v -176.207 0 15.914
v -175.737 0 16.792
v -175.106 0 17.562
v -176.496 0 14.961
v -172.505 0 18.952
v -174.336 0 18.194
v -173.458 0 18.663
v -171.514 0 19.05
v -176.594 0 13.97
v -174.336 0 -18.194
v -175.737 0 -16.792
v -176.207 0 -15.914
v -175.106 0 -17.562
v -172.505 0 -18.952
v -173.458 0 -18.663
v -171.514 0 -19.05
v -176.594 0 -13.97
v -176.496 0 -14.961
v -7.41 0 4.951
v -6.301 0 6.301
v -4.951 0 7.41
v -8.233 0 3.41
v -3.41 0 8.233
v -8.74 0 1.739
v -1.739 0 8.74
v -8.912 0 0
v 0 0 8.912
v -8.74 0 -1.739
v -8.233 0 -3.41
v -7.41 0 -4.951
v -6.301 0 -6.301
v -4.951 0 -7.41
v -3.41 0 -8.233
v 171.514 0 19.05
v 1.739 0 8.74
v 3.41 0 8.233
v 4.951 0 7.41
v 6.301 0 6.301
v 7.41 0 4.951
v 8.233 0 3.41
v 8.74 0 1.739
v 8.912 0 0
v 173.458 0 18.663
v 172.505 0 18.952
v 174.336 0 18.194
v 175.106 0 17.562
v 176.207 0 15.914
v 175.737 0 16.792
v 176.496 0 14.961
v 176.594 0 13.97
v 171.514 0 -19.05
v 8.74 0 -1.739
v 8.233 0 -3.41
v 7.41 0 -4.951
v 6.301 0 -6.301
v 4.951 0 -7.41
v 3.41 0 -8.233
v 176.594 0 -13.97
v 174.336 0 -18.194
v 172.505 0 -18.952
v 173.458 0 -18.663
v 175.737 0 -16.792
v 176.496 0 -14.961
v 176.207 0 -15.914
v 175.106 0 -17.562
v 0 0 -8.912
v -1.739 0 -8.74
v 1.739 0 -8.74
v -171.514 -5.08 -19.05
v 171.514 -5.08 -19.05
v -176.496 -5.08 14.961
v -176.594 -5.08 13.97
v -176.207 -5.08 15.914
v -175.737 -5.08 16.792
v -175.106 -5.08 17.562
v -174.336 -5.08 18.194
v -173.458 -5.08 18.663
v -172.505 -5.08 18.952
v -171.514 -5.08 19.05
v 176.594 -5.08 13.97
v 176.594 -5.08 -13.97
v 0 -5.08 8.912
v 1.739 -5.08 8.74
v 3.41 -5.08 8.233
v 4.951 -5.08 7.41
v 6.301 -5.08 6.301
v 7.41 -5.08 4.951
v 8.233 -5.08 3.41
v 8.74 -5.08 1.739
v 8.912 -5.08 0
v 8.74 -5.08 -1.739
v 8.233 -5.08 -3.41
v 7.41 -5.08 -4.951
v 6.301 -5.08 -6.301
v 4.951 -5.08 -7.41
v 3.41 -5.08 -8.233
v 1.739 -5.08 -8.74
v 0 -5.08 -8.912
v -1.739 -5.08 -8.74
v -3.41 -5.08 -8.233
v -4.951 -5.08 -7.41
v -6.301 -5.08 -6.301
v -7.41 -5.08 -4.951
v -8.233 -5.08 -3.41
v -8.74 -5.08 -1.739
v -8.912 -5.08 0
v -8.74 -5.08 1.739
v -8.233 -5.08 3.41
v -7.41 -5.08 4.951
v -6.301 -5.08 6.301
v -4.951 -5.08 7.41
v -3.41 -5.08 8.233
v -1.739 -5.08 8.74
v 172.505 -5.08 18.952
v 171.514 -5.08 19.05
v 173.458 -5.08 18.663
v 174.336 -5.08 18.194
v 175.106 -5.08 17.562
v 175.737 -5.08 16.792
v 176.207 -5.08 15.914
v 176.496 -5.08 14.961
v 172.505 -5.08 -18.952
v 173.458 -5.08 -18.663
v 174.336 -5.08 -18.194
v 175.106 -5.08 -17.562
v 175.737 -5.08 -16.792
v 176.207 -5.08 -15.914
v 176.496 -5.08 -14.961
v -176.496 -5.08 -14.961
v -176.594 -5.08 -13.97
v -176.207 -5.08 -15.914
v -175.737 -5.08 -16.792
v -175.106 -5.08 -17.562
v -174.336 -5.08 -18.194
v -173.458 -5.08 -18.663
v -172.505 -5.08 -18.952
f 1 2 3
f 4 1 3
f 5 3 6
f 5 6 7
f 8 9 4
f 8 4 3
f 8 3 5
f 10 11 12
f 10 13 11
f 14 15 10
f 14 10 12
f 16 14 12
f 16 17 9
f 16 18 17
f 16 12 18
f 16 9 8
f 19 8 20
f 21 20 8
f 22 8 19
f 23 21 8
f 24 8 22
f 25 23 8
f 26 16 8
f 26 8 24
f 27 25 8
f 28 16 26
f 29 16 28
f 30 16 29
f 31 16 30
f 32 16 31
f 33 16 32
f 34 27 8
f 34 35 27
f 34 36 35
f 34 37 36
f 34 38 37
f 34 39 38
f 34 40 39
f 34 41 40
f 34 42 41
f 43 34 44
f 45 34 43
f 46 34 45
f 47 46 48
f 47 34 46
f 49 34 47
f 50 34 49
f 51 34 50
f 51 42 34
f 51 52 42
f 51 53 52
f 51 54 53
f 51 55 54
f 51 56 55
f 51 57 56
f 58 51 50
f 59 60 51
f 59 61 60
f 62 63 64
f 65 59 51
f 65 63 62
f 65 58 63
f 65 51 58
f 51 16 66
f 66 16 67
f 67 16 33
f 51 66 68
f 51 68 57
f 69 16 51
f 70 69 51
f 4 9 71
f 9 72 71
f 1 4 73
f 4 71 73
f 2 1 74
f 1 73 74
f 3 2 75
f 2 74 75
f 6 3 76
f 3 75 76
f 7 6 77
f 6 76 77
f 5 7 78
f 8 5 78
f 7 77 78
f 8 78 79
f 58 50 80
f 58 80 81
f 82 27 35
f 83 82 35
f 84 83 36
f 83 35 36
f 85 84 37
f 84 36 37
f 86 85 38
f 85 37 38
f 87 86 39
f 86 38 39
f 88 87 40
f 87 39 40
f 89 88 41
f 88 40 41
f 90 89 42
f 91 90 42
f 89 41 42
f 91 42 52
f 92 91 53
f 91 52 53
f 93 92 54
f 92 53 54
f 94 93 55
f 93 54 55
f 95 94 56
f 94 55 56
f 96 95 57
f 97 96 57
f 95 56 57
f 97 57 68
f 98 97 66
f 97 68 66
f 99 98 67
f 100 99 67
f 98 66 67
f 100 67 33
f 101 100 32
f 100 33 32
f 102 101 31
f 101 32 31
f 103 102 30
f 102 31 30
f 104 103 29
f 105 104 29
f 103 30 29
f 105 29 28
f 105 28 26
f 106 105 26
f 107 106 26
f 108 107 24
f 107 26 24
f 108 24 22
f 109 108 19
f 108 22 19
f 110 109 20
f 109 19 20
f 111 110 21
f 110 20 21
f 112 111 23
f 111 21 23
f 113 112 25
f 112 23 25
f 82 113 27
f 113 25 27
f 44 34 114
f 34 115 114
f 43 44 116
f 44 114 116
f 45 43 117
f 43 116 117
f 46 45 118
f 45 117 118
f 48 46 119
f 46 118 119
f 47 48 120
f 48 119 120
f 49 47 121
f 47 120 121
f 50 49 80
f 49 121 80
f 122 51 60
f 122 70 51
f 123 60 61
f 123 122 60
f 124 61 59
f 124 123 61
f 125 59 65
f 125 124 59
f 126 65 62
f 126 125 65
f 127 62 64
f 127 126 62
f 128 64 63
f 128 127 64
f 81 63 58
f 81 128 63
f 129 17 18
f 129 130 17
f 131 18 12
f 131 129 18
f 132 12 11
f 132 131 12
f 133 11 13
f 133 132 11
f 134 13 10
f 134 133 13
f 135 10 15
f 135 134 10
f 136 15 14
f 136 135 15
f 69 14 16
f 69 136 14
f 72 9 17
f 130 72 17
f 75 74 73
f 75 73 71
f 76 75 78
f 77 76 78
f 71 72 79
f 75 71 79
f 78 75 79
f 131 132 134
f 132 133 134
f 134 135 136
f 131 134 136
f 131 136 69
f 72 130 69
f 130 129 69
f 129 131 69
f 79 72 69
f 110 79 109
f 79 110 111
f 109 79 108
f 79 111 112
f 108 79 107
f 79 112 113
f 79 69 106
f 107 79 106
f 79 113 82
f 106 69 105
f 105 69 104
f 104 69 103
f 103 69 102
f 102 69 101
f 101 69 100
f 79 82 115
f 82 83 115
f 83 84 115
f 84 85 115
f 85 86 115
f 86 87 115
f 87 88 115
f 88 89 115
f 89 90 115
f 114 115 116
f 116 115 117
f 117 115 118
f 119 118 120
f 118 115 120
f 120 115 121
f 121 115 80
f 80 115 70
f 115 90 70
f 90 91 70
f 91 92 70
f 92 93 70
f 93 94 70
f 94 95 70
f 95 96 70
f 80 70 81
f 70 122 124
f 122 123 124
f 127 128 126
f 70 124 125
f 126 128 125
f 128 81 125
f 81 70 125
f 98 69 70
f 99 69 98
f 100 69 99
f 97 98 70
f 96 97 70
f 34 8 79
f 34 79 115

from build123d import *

# Parameters (mm, degrees)
SKETCH1_W           = 353.187
SKETCH1_H           = 38.1
SKETCH1_R           = 8.911624301
BOSS_EXTRUDE1_DEPTH = 5.08
FILLET1_R           = 5.08


with BuildPart() as part:
    # Sketch1 → Boss-Extrude1 (new body)
    with BuildSketch(Plane(origin=(0, 0, 0), x_dir=(1, 0, 0), z_dir=(0, 1, 0))):
        Rectangle(SKETCH1_W, SKETCH1_H)
        with Locations(Location((0, 0, 0), (0, 0, 270))):
            Circle(SKETCH1_R, mode=Mode.SUBTRACT)
    extrude(amount=-BOSS_EXTRUDE1_DEPTH)

    # Fillet1
    fillet1_edges = [part.edges().sort_by_distance(p)[0] for p in [
        (-176.5935, -2.54, -19.05),
        (176.5935, -2.54, -19.05),
        (176.5935, -2.54, 19.05),
        (-176.5935, -2.54, 19.05),
    ]]
    fillet(fillet1_edges, radius=FILLET1_R)


solid = part.part
